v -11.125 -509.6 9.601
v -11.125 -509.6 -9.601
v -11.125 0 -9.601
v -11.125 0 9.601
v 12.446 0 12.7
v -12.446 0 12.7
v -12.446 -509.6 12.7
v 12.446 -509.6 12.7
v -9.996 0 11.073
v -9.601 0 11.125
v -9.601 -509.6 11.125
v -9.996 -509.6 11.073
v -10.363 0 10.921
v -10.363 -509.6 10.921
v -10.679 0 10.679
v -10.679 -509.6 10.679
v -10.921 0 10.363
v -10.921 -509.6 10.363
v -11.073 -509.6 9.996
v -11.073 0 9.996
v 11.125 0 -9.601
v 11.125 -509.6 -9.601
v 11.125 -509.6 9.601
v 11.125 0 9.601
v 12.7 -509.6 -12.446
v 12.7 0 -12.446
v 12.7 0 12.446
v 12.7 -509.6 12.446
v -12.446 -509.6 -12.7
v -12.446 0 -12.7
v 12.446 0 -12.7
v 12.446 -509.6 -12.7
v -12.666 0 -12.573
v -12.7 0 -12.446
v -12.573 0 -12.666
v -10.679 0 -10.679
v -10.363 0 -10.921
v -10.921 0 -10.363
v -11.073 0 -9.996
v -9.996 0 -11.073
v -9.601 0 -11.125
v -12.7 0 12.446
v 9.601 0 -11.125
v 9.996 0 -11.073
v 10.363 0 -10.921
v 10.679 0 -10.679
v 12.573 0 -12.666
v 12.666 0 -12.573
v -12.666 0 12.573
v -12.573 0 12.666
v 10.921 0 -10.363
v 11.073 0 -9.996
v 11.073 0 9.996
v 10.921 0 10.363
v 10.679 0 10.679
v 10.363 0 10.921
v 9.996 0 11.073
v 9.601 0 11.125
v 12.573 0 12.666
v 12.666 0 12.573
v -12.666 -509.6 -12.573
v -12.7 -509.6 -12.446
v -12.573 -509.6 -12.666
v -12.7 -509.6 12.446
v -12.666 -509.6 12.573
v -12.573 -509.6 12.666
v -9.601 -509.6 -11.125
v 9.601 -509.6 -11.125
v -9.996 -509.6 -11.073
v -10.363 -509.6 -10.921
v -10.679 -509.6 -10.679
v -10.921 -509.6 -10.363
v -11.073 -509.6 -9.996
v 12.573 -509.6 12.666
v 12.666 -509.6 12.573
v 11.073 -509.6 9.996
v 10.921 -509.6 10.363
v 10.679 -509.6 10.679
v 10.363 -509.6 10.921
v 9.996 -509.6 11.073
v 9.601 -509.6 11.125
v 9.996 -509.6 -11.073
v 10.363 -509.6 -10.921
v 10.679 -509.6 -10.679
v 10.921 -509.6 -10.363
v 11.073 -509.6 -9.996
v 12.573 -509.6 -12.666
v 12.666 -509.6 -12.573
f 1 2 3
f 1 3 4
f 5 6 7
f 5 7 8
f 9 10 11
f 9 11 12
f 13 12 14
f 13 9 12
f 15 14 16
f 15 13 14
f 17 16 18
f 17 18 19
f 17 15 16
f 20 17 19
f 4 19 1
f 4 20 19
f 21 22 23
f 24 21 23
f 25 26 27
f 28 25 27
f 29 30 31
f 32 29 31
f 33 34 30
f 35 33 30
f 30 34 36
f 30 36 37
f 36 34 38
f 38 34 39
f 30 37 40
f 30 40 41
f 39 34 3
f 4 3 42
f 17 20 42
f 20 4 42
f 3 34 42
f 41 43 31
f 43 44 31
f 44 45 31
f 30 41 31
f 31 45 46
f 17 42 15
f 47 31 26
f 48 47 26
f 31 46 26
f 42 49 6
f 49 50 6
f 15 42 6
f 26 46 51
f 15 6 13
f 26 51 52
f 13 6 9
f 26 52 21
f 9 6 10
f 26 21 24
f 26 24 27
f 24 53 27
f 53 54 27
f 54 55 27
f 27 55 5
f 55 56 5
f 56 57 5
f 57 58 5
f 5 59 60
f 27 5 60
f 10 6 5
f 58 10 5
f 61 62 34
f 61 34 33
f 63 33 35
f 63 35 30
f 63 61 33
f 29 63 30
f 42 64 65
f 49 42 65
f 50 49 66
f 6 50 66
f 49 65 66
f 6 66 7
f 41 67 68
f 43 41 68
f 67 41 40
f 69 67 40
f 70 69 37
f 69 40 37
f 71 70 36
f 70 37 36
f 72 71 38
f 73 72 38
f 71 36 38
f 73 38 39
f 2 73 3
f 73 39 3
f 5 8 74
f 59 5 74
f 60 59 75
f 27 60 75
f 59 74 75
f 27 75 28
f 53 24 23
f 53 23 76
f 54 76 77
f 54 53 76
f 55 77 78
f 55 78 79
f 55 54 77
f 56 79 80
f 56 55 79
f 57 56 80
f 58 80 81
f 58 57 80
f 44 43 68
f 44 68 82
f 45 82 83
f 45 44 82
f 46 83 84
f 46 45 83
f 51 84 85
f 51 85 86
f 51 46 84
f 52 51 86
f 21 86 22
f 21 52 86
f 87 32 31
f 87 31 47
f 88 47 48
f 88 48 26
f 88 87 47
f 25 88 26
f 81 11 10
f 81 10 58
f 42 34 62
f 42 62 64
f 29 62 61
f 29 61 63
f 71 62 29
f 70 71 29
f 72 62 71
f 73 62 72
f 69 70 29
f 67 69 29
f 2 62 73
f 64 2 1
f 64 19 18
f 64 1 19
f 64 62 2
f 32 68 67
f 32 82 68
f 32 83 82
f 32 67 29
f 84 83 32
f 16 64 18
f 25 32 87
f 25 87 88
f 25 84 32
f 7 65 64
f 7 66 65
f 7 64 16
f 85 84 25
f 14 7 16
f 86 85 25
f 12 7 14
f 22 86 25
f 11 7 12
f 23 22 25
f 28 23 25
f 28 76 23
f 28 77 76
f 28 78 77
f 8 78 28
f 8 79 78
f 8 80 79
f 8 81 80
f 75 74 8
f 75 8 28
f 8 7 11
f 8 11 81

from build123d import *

# Parameters (mm, degrees)
F0_W     = 25.4
F0_H     = 25.4
F1_DEPTH = 736.6
F2_W     = 22.2504
F2_H     = 22.2504
F3_DEPTH = 736.6
F4_R     = 1.524
F5_R     = 0.254
F6_DEPTH = 226.9998


with BuildPart() as f1:
    # F0 (on Front) → F1 (new body)
    with BuildSketch(Plane.XZ):
        Rectangle(F0_W, F0_H)
    extrude(amount=F1_DEPTH)

    # F2 (on face) → F3 (cut, through all)
    with BuildSketch(Plane.XZ.offset(736.6)):
        Rectangle(F2_W, F2_H)
    extrude(amount=-F3_DEPTH, mode=Mode.SUBTRACT)

    # F4
    f4_edges = [f1.edges().sort_by_distance(p)[0] for p in [
        (-11.1252, -368.3, 11.1252),
        (11.1252, -368.3, -11.1252),
        (11.1252, -368.3, 11.1252),
        (-11.1252, -368.3, -11.1252),
    ]]
    fillet(f4_edges, radius=F4_R)

    # F5
    f5_edges = [f1.edges().sort_by_distance(p)[0] for p in [
        (12.7, -368.3, 12.7),
        (12.7, -368.3, -12.7),
        (-12.7, -368.3, -12.7),
        (-12.7, -368.3, 12.7),
    ]]
    fillet(f5_edges, radius=F5_R)

    # F6 (cut): a face of the model
    f6_faces = [f1.faces().sort_by_distance(p)[0] for p in [
        (12.3407897552, -736.6, 0),
    ]]
    extrude(f6_faces, amount=-F6_DEPTH, mode=Mode.SUBTRACT)


solid = f1.part
